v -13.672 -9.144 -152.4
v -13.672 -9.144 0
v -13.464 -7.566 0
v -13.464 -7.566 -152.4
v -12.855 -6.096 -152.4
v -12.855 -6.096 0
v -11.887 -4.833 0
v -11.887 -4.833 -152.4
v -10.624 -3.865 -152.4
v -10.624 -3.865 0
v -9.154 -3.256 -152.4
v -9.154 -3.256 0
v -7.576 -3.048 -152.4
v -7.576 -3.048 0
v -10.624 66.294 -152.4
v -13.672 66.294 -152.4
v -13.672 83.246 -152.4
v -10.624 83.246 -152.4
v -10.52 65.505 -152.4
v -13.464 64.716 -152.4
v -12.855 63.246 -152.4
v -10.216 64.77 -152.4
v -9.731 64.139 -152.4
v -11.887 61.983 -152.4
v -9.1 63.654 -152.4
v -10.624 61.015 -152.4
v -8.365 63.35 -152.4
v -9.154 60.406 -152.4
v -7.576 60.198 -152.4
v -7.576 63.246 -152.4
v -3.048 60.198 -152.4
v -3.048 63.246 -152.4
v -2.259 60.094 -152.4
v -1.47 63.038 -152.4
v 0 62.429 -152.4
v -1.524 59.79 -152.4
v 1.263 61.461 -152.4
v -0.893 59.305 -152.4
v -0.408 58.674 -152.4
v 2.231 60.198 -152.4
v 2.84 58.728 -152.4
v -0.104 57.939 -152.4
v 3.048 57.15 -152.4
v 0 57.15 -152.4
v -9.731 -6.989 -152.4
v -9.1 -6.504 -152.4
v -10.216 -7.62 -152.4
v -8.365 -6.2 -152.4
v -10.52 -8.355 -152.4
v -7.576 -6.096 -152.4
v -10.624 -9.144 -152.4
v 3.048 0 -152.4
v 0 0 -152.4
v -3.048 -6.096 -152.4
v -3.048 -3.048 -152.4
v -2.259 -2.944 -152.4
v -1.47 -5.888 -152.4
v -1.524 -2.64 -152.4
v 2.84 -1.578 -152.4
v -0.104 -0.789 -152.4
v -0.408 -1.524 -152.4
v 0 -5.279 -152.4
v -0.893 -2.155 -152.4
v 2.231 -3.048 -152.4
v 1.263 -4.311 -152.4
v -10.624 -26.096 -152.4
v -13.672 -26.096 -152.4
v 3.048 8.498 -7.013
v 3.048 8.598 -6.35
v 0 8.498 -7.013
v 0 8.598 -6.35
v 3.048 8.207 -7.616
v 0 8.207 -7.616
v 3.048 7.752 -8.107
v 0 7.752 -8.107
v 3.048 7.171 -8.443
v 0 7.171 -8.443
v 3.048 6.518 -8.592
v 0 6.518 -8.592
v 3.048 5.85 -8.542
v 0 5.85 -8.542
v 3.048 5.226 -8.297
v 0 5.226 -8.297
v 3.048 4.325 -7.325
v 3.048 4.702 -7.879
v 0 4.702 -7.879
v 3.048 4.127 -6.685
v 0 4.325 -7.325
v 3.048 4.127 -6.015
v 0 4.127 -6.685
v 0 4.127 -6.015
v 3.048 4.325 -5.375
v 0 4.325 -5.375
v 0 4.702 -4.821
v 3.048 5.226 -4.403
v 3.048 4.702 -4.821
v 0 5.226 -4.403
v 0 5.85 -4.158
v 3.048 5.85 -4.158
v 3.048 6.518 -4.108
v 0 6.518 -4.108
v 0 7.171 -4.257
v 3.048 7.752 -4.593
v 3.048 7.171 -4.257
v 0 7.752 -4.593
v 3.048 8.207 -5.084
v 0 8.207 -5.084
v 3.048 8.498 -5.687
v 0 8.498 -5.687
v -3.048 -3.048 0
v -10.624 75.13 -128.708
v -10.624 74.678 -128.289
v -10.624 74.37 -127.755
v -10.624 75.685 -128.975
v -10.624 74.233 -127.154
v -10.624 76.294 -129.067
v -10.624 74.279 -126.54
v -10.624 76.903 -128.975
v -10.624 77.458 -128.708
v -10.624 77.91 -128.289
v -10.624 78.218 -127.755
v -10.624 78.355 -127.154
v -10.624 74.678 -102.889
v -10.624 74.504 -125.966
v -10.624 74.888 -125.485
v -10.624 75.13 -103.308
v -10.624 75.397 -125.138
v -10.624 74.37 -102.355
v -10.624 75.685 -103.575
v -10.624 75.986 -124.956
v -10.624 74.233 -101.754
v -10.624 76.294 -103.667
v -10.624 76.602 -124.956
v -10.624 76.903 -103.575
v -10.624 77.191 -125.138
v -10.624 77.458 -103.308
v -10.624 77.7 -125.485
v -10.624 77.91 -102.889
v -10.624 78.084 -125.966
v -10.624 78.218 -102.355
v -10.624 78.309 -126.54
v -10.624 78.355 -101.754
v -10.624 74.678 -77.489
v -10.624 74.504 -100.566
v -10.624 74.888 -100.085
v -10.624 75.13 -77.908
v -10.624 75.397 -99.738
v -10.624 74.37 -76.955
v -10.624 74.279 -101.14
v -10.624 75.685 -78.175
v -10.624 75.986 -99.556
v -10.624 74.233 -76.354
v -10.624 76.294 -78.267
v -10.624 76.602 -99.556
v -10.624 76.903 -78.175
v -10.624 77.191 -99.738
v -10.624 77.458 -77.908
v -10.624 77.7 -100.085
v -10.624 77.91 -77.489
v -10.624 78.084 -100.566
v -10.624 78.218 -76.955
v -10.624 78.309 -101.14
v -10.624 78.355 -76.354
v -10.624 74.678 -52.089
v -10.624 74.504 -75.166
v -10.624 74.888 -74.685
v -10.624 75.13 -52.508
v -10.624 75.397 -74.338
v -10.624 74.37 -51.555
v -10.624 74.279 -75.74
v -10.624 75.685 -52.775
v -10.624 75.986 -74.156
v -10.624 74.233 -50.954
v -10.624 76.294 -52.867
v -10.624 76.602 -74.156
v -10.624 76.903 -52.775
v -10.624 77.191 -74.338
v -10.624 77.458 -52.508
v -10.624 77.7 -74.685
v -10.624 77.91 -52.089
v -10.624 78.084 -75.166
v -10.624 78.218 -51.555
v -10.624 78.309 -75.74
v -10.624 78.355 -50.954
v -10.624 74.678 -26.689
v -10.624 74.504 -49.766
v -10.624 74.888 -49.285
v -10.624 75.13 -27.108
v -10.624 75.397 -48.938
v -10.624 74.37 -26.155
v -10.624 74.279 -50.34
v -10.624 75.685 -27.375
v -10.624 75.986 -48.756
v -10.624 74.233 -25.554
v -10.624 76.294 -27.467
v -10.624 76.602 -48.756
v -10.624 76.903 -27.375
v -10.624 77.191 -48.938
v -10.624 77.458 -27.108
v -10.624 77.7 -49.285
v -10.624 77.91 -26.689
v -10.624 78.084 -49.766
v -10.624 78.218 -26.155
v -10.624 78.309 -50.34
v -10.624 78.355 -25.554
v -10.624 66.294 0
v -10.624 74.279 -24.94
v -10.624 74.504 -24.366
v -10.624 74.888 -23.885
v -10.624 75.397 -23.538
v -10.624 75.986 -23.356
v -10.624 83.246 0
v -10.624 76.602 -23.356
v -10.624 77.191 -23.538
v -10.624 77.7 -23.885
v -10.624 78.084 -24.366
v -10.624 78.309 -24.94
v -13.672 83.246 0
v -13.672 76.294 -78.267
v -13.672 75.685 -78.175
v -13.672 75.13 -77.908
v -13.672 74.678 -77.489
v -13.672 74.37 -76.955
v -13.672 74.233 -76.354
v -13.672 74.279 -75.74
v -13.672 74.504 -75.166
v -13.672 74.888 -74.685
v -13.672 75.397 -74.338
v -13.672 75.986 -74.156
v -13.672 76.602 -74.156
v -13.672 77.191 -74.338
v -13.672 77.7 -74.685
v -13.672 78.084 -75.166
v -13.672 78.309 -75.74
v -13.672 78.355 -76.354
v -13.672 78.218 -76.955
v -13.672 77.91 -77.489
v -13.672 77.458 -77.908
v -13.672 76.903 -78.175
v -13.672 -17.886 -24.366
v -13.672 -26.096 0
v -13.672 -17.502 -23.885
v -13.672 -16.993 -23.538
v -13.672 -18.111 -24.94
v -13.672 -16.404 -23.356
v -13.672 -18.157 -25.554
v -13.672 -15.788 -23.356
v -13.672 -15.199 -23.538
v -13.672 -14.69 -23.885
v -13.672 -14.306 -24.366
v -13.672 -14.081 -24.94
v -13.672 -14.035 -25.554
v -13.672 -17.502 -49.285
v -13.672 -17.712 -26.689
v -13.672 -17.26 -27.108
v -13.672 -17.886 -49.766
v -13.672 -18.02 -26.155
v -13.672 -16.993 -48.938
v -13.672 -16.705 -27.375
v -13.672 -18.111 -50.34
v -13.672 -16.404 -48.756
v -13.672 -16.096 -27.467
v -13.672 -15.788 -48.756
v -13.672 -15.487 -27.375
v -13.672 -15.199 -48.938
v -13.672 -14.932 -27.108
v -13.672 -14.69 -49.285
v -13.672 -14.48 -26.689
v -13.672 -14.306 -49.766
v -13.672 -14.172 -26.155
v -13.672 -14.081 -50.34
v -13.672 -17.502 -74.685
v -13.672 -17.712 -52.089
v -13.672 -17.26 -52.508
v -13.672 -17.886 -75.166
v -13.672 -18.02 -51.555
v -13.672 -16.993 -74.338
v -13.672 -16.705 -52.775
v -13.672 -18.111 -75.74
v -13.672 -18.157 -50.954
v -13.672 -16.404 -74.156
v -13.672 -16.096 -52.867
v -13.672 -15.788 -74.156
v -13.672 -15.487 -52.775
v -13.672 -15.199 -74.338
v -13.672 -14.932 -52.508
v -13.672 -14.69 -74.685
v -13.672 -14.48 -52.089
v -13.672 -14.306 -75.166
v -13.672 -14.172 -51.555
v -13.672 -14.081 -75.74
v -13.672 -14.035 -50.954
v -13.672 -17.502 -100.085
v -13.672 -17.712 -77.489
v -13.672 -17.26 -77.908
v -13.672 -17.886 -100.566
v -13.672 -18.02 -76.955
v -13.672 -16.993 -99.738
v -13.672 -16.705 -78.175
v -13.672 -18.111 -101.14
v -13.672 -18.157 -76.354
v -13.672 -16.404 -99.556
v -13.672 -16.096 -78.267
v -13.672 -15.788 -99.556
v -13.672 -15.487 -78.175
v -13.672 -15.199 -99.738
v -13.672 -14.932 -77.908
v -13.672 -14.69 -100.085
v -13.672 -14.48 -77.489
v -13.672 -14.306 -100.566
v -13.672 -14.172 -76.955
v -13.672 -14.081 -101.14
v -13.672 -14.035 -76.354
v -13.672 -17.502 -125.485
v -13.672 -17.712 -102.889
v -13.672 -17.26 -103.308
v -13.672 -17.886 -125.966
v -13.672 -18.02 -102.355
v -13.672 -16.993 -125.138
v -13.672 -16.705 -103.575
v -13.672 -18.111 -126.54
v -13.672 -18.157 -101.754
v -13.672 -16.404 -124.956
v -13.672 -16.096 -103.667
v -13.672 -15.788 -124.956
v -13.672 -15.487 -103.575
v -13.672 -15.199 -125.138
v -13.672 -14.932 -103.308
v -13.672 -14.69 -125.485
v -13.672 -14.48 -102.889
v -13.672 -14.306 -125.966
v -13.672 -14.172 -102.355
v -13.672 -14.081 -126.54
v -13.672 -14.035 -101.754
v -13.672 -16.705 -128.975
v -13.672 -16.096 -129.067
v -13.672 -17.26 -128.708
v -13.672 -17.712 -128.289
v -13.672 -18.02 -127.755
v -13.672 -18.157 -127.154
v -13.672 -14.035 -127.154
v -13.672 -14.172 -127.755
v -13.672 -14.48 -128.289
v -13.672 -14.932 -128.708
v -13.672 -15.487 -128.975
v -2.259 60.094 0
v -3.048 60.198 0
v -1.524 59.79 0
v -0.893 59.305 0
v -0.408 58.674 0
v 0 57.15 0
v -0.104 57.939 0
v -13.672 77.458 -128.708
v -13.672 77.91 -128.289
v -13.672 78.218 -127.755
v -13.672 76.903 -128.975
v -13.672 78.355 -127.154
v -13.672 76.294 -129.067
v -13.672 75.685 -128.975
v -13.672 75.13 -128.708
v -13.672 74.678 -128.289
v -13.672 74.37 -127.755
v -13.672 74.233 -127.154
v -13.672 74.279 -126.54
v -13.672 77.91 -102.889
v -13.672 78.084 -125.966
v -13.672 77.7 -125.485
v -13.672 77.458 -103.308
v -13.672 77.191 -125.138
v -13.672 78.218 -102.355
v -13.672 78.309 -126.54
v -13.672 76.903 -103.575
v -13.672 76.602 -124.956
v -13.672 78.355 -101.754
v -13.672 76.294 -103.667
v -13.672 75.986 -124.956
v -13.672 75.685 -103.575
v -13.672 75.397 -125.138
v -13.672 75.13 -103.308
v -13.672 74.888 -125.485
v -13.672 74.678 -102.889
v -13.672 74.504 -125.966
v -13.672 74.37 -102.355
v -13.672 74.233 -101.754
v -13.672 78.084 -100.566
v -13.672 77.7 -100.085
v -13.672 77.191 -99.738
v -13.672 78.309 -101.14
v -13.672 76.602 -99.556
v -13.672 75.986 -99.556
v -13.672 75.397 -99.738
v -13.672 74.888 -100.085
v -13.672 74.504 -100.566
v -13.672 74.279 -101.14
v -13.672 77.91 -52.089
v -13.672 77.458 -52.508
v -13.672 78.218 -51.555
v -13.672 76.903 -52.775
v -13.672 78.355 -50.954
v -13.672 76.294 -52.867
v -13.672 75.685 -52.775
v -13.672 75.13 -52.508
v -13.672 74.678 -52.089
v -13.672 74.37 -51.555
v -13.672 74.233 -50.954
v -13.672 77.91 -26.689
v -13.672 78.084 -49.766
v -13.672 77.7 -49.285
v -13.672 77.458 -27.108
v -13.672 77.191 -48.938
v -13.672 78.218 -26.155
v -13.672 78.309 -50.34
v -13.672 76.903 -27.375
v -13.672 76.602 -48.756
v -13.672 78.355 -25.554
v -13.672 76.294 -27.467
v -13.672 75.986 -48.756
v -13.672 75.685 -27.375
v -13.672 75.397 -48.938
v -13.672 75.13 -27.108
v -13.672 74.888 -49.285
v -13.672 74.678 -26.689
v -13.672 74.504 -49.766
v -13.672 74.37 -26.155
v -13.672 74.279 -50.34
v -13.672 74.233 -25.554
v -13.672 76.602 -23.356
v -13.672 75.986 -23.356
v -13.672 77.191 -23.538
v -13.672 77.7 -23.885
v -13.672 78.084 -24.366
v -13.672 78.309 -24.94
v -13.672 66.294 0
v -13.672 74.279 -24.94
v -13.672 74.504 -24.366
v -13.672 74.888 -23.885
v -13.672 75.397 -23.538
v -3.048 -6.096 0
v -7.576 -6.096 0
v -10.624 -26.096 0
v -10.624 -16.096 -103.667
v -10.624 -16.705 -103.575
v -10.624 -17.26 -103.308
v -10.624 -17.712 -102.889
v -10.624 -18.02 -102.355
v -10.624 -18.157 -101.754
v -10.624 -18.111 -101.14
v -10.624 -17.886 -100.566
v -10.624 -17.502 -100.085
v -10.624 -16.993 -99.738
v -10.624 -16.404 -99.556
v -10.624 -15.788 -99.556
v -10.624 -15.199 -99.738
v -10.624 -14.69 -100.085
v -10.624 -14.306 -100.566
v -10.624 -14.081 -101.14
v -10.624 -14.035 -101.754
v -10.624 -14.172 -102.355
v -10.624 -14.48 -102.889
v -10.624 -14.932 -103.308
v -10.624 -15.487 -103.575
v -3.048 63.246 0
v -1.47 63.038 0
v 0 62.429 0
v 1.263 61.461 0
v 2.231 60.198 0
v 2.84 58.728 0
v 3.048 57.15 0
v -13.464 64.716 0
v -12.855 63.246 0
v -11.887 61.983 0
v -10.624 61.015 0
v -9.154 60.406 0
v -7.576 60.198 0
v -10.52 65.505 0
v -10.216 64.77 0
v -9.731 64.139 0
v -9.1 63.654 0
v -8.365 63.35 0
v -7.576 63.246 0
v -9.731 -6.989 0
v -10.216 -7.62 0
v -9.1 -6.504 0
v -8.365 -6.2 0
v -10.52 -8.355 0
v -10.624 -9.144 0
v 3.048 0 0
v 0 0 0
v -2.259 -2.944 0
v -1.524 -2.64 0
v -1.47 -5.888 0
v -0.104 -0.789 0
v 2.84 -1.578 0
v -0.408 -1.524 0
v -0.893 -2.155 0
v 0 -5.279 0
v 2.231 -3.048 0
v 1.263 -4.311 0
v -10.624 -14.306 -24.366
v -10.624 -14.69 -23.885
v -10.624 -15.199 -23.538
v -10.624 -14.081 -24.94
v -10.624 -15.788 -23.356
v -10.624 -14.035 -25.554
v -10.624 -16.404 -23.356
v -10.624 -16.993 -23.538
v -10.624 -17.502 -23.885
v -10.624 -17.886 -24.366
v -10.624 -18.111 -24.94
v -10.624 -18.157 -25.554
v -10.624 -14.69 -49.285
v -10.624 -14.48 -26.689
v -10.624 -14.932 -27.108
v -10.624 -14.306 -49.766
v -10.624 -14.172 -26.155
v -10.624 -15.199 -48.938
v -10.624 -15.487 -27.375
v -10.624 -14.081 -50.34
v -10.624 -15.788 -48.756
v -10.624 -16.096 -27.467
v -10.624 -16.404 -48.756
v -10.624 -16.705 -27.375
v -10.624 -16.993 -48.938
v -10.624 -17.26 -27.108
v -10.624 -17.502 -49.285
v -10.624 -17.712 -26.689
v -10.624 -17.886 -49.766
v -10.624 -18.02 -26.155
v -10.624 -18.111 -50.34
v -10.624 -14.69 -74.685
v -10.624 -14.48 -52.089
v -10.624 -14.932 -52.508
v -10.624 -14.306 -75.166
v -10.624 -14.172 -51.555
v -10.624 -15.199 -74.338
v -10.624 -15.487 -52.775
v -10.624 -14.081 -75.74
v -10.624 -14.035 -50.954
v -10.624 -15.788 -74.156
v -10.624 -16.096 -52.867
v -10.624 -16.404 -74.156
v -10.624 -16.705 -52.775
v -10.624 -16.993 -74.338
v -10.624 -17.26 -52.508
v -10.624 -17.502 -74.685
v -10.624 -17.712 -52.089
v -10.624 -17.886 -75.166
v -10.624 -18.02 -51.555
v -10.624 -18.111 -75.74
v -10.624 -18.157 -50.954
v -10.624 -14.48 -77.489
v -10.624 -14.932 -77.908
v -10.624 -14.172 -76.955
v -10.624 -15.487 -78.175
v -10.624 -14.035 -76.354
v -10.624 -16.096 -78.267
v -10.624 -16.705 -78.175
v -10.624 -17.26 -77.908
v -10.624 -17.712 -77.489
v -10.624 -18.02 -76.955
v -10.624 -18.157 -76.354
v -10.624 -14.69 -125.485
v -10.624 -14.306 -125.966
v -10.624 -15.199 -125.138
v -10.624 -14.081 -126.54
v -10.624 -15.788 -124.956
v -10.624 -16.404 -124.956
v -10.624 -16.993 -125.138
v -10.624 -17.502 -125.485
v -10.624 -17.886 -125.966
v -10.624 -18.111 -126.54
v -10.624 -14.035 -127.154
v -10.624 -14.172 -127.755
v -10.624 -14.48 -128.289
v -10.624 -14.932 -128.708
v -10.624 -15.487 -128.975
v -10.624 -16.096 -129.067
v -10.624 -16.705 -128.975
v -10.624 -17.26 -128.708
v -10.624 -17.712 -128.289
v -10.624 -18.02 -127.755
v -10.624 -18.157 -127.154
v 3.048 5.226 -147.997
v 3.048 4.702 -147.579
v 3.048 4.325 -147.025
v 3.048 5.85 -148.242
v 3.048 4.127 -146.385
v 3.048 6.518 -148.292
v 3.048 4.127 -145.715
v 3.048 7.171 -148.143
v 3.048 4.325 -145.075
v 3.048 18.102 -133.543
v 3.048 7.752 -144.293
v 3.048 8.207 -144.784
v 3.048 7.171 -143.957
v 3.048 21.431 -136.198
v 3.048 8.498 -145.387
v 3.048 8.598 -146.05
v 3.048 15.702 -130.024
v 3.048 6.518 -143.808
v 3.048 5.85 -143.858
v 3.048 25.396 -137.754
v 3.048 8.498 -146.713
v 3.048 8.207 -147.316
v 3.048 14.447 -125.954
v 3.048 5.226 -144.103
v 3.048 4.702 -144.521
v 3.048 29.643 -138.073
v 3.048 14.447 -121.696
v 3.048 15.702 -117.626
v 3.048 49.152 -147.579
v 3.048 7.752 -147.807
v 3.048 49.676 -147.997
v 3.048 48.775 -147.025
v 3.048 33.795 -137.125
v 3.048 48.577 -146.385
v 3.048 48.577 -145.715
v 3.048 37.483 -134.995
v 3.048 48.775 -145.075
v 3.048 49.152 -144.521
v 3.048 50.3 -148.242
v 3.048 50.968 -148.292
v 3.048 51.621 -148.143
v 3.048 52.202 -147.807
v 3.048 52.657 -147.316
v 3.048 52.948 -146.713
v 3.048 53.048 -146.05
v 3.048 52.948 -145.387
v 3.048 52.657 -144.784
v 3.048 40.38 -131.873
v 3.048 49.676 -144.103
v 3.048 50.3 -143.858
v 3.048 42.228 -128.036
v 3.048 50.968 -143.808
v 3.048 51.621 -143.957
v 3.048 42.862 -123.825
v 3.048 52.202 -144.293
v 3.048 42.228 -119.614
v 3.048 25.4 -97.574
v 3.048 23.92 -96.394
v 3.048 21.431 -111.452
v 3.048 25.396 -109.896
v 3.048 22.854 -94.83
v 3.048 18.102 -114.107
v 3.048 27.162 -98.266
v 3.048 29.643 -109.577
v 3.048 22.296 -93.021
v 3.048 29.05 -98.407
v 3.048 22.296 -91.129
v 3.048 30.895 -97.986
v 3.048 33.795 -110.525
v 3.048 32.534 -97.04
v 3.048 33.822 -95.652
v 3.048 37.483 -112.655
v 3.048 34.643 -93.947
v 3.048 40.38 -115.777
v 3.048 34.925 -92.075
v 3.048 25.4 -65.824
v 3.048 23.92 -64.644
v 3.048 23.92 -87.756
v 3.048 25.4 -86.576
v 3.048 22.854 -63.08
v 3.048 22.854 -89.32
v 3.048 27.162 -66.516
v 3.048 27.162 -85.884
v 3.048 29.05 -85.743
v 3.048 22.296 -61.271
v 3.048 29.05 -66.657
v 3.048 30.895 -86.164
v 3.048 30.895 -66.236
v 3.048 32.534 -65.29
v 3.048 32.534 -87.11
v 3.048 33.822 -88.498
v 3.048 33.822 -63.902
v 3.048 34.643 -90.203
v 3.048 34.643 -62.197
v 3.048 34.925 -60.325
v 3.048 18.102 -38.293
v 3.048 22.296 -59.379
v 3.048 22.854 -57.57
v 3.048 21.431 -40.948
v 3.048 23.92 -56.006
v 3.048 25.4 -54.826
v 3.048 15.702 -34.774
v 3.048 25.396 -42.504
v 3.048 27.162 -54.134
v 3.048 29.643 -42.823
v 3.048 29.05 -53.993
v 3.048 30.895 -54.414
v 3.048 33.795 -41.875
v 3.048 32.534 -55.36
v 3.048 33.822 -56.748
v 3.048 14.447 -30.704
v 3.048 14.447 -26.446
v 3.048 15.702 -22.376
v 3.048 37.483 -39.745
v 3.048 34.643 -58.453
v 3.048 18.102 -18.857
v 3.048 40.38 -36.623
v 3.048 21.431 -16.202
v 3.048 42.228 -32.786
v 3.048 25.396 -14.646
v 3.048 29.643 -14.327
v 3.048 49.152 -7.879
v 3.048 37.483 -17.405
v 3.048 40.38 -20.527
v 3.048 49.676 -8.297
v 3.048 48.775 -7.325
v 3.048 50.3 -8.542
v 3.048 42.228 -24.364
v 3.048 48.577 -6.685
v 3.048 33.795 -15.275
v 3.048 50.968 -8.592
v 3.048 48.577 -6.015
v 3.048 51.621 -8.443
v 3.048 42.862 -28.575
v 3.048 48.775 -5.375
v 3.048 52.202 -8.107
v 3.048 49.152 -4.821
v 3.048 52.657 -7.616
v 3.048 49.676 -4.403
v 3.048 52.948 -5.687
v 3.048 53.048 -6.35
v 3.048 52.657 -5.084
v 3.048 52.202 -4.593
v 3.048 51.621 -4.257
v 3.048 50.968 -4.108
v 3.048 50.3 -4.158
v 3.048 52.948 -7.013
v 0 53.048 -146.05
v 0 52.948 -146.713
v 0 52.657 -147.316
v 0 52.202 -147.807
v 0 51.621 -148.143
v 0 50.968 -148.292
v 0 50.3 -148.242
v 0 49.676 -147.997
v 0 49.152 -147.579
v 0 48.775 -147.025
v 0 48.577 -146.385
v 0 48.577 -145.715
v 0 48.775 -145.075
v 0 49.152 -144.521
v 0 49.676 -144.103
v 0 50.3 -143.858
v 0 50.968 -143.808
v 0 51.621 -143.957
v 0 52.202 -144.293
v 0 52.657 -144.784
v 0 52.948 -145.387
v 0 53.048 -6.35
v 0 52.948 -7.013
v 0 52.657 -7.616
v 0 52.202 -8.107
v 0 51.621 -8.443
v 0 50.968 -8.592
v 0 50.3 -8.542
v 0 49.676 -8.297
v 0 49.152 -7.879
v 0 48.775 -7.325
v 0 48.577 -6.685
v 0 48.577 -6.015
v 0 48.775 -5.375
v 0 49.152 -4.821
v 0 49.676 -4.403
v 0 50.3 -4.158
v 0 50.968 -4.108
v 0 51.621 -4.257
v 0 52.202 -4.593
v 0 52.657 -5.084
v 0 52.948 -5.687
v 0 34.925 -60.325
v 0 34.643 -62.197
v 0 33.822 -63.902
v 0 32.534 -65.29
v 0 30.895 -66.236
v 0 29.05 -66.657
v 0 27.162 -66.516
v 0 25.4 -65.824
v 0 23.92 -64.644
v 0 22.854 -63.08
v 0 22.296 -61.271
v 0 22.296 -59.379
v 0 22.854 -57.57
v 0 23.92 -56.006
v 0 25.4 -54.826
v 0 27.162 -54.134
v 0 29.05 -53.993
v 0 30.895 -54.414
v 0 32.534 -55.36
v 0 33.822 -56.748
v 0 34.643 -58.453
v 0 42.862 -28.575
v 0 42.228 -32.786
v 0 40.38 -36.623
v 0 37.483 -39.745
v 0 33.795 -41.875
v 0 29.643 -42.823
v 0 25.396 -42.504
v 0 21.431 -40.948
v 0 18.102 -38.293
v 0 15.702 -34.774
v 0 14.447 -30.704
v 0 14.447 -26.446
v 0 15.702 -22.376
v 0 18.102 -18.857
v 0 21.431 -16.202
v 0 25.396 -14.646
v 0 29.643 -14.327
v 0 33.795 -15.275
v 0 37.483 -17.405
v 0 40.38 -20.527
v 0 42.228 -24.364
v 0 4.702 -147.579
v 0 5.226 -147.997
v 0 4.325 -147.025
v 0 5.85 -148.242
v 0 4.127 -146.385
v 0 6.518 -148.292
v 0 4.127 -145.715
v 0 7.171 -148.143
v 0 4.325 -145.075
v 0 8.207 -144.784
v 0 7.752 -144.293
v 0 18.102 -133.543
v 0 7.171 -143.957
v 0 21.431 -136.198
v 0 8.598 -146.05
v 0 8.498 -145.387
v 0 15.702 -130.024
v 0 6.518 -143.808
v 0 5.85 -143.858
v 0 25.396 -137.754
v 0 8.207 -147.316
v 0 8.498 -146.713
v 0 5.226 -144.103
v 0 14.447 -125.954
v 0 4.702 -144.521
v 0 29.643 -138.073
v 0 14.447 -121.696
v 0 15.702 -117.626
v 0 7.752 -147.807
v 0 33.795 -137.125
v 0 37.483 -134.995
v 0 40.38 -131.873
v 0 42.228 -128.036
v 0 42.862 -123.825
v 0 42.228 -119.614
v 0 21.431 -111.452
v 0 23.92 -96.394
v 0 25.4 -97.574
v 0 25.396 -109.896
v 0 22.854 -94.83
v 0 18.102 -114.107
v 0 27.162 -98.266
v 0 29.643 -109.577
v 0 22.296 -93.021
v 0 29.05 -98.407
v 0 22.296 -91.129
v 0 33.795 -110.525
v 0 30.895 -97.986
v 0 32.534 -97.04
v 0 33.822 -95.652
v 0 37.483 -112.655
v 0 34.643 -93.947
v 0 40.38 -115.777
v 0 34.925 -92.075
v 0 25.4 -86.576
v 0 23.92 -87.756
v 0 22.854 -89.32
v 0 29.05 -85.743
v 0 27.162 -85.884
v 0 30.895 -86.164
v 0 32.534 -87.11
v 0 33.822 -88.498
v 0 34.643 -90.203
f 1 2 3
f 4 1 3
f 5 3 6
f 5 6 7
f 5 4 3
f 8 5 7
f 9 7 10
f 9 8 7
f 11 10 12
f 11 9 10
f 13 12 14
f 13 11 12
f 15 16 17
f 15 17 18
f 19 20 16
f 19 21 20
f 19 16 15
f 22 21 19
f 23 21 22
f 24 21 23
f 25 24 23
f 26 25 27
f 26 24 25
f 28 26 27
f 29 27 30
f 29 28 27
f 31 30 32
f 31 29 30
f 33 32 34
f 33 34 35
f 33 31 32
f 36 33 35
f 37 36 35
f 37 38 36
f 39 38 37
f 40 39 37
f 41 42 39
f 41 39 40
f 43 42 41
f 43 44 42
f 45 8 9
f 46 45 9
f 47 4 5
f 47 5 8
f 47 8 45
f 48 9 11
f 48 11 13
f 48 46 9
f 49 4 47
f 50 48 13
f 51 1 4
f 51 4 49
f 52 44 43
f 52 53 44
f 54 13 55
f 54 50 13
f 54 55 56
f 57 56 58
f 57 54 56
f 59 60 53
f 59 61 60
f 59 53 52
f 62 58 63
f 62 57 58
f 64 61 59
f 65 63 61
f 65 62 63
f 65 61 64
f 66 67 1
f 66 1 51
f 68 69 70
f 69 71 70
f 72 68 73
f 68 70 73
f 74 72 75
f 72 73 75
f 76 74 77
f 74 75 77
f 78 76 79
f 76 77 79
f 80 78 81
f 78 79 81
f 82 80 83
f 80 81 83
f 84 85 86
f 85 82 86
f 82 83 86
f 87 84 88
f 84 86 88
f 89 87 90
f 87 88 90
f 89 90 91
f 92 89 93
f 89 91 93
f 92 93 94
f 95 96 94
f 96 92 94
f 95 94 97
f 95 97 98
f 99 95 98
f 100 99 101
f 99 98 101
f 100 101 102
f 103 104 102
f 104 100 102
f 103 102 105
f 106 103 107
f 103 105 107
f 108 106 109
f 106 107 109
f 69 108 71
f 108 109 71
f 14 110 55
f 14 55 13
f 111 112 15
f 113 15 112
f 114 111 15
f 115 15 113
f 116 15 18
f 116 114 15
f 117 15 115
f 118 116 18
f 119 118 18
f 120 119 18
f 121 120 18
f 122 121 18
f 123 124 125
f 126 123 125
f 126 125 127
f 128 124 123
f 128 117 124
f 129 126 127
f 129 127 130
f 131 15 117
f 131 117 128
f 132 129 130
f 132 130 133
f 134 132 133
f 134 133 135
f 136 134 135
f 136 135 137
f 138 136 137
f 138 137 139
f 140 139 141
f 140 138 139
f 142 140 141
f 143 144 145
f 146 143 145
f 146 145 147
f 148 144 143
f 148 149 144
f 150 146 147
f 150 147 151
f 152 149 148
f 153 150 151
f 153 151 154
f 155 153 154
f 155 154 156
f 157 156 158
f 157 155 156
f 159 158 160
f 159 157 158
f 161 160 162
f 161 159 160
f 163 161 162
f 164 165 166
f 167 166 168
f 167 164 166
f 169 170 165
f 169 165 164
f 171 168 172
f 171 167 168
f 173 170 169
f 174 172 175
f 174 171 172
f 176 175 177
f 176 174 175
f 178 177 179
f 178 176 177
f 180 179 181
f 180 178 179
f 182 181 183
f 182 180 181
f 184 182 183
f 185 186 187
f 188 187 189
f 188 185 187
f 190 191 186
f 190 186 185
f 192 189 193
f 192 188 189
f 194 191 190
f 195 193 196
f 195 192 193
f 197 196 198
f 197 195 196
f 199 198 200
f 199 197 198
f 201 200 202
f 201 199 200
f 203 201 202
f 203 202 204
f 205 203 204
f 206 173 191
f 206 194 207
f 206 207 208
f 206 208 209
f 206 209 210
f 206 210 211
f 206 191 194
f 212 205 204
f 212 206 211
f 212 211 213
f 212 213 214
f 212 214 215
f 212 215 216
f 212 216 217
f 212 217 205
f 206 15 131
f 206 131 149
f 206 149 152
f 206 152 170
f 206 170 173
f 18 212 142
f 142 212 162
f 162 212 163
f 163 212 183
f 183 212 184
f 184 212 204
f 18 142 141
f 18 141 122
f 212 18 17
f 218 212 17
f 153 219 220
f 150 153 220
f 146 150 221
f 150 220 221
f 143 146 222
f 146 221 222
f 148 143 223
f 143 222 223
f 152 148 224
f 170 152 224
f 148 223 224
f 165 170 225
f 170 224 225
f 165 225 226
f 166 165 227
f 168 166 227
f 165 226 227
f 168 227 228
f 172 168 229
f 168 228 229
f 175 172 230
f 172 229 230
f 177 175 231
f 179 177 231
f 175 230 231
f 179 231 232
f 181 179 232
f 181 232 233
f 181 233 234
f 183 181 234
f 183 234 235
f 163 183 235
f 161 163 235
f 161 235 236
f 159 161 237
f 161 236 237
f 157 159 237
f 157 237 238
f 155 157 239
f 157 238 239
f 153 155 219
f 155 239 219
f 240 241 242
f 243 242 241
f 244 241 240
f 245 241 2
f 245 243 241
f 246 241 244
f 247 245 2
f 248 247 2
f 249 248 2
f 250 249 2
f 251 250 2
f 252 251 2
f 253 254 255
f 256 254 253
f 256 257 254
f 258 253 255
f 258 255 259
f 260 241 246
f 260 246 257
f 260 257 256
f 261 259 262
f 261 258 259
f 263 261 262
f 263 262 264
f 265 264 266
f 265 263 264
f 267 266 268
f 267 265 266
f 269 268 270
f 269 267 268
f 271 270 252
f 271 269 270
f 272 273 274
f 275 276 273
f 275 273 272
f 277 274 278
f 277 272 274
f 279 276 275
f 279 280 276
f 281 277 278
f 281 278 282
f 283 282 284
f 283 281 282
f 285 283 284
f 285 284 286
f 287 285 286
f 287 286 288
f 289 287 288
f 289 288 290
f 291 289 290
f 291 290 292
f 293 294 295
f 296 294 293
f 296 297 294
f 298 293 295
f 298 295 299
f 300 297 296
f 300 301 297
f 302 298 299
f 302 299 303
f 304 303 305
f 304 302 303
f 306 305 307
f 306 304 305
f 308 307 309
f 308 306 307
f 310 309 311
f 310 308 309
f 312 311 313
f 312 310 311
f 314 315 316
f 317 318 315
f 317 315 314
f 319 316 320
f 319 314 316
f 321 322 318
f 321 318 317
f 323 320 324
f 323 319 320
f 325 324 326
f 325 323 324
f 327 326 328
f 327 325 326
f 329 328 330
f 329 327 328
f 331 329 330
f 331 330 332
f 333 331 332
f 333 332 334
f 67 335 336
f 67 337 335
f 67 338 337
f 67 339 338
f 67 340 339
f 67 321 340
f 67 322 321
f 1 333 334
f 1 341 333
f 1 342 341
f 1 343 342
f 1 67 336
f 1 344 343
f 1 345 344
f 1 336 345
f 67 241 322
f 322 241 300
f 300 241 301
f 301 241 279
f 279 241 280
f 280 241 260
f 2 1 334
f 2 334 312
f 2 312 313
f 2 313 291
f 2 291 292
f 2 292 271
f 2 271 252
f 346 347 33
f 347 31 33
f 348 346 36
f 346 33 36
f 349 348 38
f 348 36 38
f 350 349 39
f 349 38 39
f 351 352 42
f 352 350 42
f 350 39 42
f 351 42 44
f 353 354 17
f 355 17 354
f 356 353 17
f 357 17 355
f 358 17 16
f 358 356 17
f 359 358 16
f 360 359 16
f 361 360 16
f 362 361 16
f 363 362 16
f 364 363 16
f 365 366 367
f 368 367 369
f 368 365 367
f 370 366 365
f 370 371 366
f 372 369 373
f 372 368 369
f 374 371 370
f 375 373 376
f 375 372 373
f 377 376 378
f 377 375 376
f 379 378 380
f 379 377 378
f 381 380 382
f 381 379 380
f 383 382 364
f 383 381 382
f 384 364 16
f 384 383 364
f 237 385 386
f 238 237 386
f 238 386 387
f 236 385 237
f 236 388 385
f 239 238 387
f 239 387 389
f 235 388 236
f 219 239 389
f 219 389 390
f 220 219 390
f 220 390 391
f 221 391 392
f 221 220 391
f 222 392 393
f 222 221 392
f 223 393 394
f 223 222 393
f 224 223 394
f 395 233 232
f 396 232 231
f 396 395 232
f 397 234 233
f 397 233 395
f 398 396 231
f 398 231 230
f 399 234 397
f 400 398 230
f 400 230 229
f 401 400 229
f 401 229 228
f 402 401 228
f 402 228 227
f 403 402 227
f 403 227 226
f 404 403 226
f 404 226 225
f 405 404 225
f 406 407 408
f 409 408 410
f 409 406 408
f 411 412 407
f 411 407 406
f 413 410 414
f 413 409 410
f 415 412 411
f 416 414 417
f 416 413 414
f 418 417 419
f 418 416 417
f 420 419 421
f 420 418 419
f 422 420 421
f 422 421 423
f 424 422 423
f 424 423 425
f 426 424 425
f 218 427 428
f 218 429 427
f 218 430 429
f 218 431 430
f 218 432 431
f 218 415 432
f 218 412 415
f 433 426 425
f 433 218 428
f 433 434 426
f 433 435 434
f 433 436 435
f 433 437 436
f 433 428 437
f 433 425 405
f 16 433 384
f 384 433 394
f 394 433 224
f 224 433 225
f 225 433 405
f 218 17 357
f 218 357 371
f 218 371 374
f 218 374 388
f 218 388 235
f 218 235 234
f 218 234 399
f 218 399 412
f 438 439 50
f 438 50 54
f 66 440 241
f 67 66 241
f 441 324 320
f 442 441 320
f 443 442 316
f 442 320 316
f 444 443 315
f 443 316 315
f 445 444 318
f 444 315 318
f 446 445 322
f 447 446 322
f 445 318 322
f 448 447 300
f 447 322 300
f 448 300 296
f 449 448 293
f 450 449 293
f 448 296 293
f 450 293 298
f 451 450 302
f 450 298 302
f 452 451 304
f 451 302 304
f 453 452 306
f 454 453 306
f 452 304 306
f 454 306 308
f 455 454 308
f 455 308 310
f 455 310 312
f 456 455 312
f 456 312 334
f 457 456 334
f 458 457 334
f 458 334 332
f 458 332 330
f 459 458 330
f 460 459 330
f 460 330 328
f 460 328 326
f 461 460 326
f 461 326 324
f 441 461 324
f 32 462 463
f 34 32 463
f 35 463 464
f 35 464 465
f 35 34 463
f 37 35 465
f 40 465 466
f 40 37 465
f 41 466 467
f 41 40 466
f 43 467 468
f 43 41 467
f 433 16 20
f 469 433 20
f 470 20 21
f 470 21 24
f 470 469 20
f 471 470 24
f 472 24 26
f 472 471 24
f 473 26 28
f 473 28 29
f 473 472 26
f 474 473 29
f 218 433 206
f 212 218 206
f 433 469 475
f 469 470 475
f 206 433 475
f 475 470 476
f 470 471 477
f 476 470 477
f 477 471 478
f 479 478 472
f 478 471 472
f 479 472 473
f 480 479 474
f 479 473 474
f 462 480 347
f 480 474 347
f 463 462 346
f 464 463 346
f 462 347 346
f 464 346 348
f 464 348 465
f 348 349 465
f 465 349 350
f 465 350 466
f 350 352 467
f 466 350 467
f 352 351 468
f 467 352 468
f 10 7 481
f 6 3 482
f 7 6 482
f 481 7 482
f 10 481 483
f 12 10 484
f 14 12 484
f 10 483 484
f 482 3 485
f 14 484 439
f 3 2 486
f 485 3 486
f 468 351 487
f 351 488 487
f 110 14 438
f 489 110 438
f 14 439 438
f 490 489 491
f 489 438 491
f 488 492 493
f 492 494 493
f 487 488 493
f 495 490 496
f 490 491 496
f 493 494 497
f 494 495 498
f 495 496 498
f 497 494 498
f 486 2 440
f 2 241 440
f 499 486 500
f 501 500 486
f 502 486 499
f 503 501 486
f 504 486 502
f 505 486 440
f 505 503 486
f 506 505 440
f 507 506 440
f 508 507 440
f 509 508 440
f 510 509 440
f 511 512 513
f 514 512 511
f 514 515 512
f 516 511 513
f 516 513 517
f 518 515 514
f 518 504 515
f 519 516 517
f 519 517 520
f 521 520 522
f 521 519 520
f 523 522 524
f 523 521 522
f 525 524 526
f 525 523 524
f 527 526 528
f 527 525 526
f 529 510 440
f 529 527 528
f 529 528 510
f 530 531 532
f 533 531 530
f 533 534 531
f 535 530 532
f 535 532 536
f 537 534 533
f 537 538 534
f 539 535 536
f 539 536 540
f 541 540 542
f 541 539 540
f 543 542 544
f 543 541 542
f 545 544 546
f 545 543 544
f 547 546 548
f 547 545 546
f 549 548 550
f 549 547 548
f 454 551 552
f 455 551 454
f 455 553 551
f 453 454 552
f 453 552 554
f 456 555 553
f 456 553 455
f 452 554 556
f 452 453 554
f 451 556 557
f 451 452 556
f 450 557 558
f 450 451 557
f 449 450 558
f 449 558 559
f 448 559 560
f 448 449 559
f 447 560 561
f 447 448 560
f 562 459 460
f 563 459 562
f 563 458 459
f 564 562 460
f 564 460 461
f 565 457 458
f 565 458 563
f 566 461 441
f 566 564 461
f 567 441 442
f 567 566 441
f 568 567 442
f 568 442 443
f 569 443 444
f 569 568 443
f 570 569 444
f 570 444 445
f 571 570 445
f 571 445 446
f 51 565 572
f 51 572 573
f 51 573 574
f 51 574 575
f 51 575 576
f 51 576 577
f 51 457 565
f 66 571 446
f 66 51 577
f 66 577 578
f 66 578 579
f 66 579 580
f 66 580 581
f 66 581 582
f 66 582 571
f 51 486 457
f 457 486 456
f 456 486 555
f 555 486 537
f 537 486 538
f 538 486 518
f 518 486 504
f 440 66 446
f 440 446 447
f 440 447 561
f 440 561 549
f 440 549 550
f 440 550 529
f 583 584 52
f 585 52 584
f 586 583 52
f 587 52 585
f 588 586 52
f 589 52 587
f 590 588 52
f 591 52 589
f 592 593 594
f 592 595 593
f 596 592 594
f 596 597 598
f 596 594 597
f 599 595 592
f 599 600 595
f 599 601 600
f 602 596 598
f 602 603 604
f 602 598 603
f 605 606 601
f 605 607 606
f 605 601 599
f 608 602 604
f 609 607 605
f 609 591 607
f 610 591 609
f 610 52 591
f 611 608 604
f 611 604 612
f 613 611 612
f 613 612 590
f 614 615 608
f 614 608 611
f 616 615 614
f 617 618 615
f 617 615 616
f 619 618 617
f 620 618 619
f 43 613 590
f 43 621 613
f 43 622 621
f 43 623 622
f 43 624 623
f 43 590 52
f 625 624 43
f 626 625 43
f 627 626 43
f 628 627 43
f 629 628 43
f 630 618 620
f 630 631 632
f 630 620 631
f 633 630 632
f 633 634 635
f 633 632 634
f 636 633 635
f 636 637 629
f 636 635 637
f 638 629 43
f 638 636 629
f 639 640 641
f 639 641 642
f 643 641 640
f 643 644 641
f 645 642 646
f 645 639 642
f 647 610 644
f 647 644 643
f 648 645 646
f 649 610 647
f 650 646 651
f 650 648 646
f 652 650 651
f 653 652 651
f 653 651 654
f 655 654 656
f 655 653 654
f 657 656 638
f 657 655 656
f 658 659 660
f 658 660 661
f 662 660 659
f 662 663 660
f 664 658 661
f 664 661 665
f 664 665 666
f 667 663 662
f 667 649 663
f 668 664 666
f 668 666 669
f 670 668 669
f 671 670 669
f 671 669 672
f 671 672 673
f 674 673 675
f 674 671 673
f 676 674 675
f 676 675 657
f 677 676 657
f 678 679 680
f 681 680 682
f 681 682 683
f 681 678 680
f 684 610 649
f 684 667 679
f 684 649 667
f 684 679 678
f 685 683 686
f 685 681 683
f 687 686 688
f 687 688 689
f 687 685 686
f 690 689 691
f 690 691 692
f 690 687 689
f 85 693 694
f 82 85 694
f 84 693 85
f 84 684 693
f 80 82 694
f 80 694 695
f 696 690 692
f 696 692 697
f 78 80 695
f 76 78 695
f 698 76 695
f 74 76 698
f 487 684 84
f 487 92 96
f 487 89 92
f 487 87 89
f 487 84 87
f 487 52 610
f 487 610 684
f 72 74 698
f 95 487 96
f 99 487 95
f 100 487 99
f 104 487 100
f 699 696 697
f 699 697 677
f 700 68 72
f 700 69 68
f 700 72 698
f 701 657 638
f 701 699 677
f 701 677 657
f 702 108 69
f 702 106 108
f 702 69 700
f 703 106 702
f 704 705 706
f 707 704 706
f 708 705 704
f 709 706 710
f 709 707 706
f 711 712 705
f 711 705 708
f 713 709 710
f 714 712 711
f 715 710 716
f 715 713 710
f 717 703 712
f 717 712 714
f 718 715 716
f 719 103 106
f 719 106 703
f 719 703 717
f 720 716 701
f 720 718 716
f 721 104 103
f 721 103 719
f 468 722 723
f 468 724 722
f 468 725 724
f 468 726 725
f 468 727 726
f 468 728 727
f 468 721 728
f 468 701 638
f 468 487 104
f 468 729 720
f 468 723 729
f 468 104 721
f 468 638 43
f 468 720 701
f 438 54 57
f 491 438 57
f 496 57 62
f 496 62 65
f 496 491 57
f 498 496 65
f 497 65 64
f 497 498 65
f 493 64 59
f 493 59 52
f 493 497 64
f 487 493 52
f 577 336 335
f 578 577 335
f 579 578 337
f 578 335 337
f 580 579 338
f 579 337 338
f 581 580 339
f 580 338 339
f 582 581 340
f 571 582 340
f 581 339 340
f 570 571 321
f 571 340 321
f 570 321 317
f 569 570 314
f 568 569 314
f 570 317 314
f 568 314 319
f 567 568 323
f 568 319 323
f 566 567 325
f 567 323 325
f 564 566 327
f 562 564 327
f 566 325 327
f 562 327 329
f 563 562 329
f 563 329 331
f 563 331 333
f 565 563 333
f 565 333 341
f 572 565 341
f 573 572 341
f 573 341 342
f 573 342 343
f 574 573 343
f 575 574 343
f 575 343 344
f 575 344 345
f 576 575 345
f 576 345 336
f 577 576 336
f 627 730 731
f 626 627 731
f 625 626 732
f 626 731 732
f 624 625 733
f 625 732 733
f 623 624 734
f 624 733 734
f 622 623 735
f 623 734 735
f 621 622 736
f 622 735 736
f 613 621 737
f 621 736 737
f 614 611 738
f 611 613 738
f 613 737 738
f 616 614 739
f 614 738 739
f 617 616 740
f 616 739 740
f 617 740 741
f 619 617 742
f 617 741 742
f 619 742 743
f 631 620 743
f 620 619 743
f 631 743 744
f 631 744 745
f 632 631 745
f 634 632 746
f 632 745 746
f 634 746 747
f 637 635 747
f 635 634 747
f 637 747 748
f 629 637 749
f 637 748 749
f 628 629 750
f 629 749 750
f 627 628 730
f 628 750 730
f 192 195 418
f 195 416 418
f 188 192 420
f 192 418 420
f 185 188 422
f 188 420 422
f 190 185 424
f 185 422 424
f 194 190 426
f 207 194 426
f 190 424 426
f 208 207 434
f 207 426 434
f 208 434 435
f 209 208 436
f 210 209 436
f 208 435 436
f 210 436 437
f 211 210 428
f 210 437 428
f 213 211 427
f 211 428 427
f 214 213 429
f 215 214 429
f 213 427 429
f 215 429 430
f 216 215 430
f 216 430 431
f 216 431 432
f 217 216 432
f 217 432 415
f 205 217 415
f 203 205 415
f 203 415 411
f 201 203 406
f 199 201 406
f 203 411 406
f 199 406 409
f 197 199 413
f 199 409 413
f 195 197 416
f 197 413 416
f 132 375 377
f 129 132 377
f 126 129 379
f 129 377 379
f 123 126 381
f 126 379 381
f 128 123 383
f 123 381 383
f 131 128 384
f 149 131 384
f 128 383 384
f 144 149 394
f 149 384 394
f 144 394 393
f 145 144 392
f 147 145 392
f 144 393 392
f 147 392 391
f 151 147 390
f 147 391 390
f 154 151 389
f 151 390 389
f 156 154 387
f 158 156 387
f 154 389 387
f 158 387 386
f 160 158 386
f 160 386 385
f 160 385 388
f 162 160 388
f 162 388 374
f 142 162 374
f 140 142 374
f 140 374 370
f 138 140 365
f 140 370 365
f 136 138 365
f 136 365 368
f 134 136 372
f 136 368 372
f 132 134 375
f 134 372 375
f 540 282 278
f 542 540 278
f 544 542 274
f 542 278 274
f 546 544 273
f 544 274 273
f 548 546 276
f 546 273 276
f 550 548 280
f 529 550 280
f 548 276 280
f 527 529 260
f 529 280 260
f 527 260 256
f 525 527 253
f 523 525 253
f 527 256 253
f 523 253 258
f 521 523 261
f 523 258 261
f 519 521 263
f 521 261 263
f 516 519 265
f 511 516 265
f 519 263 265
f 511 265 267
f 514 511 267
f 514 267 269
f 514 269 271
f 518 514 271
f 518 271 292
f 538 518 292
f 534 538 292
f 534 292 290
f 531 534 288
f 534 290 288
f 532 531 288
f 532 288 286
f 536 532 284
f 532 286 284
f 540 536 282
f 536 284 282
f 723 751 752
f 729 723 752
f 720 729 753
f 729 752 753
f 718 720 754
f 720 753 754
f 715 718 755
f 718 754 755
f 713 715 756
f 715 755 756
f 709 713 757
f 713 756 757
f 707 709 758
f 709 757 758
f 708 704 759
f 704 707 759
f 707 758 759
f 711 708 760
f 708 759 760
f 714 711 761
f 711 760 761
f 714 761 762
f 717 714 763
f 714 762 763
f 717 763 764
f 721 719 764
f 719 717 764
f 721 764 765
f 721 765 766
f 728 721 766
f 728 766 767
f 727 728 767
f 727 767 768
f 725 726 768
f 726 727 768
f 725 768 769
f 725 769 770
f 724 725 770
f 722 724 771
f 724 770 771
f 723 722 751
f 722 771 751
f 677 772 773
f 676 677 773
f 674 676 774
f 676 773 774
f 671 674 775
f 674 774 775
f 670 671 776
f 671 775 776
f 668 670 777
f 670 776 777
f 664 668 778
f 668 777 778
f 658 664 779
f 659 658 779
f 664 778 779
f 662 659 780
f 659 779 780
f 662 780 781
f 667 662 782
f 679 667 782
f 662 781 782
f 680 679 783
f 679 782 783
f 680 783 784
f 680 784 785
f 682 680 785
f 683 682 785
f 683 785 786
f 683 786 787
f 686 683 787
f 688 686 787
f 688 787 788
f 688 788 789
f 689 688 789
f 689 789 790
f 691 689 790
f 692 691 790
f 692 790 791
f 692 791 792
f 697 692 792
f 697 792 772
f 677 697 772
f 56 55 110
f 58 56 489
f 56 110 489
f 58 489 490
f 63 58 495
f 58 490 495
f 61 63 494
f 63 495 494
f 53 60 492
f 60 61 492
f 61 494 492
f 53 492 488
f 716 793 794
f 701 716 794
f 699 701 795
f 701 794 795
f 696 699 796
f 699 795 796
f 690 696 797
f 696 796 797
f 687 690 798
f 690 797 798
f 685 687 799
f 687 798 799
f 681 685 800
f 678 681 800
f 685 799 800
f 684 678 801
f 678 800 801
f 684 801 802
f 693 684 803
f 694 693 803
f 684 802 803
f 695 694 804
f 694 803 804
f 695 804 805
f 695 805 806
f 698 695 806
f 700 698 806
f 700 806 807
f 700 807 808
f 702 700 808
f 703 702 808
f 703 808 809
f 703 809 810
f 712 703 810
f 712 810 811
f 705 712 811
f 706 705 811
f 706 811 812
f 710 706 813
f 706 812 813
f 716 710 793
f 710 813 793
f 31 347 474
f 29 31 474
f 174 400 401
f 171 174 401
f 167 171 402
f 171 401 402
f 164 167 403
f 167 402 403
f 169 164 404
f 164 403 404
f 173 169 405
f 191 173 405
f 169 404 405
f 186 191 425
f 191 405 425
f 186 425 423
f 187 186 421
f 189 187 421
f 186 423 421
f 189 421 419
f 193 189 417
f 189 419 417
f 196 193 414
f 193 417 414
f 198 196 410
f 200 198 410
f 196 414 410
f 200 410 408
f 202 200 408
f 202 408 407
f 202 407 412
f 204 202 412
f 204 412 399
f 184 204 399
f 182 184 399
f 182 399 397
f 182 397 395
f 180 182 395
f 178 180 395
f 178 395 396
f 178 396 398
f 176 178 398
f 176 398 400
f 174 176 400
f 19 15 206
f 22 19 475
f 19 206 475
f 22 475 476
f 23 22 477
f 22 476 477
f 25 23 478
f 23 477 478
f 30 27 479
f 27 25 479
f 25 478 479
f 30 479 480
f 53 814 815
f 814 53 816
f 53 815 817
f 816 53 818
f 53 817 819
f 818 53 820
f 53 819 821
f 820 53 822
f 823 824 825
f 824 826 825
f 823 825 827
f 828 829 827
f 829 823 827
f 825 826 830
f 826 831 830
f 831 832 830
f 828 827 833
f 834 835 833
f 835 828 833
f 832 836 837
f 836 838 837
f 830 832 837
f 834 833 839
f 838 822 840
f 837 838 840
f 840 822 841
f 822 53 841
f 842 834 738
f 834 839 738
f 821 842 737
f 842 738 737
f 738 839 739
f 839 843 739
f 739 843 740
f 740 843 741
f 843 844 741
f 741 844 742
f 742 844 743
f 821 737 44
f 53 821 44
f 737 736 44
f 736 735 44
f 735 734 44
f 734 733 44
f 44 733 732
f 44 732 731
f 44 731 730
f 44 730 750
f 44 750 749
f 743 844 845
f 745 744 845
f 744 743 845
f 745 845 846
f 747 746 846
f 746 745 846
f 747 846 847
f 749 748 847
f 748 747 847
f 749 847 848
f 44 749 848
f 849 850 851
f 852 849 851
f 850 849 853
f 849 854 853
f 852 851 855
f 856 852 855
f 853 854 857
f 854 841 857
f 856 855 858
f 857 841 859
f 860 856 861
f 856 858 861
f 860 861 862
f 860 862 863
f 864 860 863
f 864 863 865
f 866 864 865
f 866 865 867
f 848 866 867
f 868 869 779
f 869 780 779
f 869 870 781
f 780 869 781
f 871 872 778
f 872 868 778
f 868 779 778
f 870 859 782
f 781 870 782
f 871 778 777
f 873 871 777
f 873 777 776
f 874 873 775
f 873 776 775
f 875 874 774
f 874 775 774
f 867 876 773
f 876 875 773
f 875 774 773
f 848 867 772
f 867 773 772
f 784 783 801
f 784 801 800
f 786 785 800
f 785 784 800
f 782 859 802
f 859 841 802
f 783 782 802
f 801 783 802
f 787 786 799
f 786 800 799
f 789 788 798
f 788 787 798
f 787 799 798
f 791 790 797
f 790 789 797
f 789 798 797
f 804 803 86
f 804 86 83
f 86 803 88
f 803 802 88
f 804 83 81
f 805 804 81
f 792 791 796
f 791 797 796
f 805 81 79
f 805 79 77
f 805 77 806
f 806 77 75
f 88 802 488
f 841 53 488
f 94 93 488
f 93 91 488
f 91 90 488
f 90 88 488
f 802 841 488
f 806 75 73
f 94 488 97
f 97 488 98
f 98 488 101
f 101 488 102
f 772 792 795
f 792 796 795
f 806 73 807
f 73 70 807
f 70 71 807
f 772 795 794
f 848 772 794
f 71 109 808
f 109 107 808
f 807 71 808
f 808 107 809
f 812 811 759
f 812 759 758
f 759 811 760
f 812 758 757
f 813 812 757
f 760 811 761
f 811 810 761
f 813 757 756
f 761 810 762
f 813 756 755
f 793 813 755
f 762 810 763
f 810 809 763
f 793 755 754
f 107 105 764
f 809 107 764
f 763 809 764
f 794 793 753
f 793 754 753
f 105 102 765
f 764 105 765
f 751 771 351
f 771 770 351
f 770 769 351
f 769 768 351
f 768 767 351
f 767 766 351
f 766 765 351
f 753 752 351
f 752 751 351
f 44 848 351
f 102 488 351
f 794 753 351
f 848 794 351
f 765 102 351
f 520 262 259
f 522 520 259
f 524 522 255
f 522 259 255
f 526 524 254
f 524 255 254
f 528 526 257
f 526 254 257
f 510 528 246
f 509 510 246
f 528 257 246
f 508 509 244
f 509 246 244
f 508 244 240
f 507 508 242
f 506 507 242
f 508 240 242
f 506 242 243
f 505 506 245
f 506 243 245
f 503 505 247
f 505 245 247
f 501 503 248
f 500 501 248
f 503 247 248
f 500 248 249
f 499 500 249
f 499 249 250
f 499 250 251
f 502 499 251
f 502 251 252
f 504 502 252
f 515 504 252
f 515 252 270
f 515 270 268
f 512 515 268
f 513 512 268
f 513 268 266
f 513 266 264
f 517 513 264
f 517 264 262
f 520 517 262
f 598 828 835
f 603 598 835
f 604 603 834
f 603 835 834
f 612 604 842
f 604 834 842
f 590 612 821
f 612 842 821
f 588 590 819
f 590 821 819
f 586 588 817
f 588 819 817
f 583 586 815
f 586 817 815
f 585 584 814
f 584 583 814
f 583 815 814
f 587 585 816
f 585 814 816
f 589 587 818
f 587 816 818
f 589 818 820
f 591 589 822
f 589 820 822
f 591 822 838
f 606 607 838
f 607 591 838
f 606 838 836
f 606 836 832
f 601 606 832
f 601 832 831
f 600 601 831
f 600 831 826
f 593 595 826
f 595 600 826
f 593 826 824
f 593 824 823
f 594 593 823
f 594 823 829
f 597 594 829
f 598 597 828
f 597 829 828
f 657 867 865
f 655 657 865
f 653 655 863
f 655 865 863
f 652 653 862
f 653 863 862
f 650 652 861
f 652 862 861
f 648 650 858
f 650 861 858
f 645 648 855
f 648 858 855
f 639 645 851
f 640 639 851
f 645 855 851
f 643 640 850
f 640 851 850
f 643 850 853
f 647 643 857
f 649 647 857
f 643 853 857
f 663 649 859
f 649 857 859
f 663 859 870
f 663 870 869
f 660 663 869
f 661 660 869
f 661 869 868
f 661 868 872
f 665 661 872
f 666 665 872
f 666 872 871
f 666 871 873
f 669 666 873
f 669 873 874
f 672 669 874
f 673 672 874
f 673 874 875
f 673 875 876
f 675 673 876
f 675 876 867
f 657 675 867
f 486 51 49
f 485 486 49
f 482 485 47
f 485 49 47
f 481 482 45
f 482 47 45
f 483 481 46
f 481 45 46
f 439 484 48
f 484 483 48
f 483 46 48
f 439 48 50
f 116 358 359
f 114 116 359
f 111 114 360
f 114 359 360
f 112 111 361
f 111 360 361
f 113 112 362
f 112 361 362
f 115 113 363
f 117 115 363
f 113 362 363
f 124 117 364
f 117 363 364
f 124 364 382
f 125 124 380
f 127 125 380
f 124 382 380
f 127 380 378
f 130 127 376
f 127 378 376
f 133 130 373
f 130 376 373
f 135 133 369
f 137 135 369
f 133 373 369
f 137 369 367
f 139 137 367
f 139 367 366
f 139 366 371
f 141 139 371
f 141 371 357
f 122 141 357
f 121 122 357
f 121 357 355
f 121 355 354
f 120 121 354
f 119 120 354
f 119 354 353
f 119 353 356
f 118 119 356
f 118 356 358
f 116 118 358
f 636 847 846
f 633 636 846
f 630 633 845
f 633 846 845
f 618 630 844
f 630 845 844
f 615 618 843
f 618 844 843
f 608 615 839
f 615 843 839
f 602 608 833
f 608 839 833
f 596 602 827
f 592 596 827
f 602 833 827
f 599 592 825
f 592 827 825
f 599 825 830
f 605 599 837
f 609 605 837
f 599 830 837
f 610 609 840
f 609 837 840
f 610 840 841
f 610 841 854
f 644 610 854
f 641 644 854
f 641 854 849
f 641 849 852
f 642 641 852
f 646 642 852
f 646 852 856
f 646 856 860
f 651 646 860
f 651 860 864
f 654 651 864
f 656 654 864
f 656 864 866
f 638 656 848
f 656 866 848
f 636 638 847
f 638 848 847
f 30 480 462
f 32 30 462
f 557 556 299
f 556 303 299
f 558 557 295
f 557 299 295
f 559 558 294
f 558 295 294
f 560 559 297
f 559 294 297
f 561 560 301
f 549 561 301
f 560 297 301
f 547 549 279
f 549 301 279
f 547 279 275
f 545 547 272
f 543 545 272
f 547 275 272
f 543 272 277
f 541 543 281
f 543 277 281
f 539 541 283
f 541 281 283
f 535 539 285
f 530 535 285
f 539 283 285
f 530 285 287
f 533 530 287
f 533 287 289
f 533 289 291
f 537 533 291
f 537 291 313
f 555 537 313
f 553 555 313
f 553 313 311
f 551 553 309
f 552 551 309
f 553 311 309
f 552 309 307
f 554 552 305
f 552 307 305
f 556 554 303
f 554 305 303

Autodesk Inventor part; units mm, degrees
ref_plane "YZ Plane" through (0, 0, 0) normal (1, 0, 0) x (0, 1, 0)
ref_plane "XZ Plane" through (0, 0, 0) normal (0, 1, 0) x (-1, 0, 0)
ref_plane "XY Plane" through (0, 0, 0) normal (0, 0, 1) x (1, 0, 0)
sketch "Sketch3" plane through (-13.672, 63.246, 0) normal (0, 1, 0) x (1, 0, 0)
  line L0 (10.624, 0) -> (10.624, 152.4) projected
  line L1 (0, 152.4) -> (10.624, 152.4) projected
  line L2 (0, 0) -> (0, 152.4) projected
  line L3 (10.624, 0) -> (0, 0) projected
  point P0 (13.672, 0)
  point P1 (5.312, 127)
  point P2 (5.312, 152.4)
  point P3 (5.312, 101.6)
  point P4 (5.312, 76.2)
  point P5 (5.312, 50.8)
  point P6 (5.312, 25.4)
  dimension "d28" = 25.4
  dimension "d31" = 25.4
sketch "Sketch1" plane through (0, 0, 0) normal (1, 0, 0) x (0, 1, 0)
  line L0 (0, 0) -> (57.15, 0)
  line L1 (57.15, 0) -> (57.15, -152.4)
  line L2 (57.15, -152.4) -> (0, -152.4)
  line L3 (0, -152.4) -> (0, 0)
  circle A0 centre (28.575, -28.575) radius 14.2875
  circle A1 centre (28.575, -60.325) radius 6.35
  circle A2 centre (28.575, -92.075) radius 6.35
  circle A3 centre (28.575, -123.825) radius 14.2875
  circle A4 centre (50.8, -6.35) radius 2.2479
  circle A5 centre (50.8, -146.05) radius 2.2479
  circle A6 centre (6.35, -146.05) radius 2.2479
  circle A7 centre (6.35, -6.35) radius 2.2479
  line L4 (50.8, -6.35) -> (6.35, -6.35) construction
  line L5 (6.35, -6.35) -> (6.35, -146.05) construction
  line L6 (6.35, -146.05) -> (50.8, -146.05) construction
  line L7 (50.8, -146.05) -> (50.8, -6.35) construction
  line L8 (57.15, 0) -> (69.85, 0)
  line L9 (69.85, 0) -> (69.85, -152.4)
  line L10 (69.85, -152.4) -> (57.15, -152.4)
  line L11 (57.15, -152.4) -> (57.15, 0)
  line L12 (0, -152.4) -> (-12.7, -152.4)
  line L13 (-12.7, -152.4) -> (-12.7, 0)
  line L14 (-12.7, 0) -> (0, 0)
  line L15 (0, 0) -> (0, -152.4)
  line L16 (28.575, -123.825) -> (28.575, -28.575)
  point P0 (28.575, -152.4)
  point P1 (28.575, -6.35)
  point P2 (28.575, 0)
  point P3 (50.8, -76.2)
  point P4 (57.15, -76.2)
  point P5 (57.15, -76.2)
  point P6 (28.575, -76.2)
  dimension "d0" = 57.15
  dimension "d1" = 152.4
  dimension "d2" = 31.75
  dimension "d3" = 31.75
  dimension "d4" = 31.75
  dimension "d6" = 28.575
  dimension "d7" = 12.7
  dimension "d8" = 28.575
  dimension "d11" = 4.4958
  dimension "d12" = 139.7
  dimension "d13" = 44.45
  dimension "d14" = 12.7
  dimension "d15" = 152.4
  dimension "d16" = 12.7
  dimension "d17" = 152.4
extrude "Plate2" add sketch "Sketch1" along normal blind 3.048 contours L0 L1 L2 L3
sketch "Sketch2" plane through (-3.048, 60.198, -152.4) normal (0, 1, 0) x (-1, 0, 0)
  line L0 (0, 152.4) -> (0, 0)
  line L1 (0, 0) -> (10.624, 0)
  line L2 (10.624, 0) -> (10.624, 152.4)
  line L3 (10.624, 152.4) -> (0, 152.4)
edge flange "Flange1" height 16.72 angle 90 thickness 3.048 bend radius 3.048 thickness toward (0, 1, 0) relief tear relief width 3.048 relief depth 1.524 corner gap 3.048 corner form 0 edges at (0, 57.15, -76.2) (0, 0, -76.2) wall of the first edge with corners at (-3.048, 60.198, 0) (-3.048, 60.198, -152.4) (-13.672, 60.198, -152.4) (-13.672, 60.198, 0)
bend "Bend1"
corner "Corner1"
sketch "Sketch4" plane through (-10.624, -3.048, -152.4) normal (-1, 0, 0) x (0, -1, 0)
  line L0 (0, 152.4) -> (0, 0)
  line L1 (0, 0) -> (23.048, 0)
  line L2 (23.048, 0) -> (23.048, 152.4)
  line L3 (23.048, 152.4) -> (0, 152.4)
edge flange "Flange2" height 20 angle 90 thickness 3.048 bend radius 3.048 thickness toward (-1, 0, 0) relief tear relief width 3.048 relief depth 1.524 corner gap 3.048 corner form 0 edges at (-13.672, -6.096, -76.2) (-13.672, 63.246, -76.2) wall of the first edge with corners at (-10.624, -3.048, 0) (-10.624, -3.048, -152.4) (-10.624, -26.096, -152.4) (-10.624, -26.096, 0)
bend "Bend2"
corner "Corner2"
sketch "Sketch5" plane through (-10.624, -26.096, 0) normal (1, 0, 0) x (0, 0, -1)
  line L0 (152.4, 16.952) -> (152.4, 0) projected
  line L1 (0, 0) -> (152.4, 0) projected
  point P0 (0, 26.096)
  point P1 (127, 10)
  point P2 (101.6, 10)
  point P3 (76.2, 10)
  point P4 (50.8, 10)
  point P5 (25.4, 10)
  point P6 (50.8, 102.39)
  point P7 (25.4, 102.39)
  point P8 (76.2, 102.39)
  point P9 (101.6, 102.39)
  point P10 (127, 102.39)
  dimension "d53" = 25.4
  dimension "d54" = 10
  dimension "d57" = 25.4
  dimension "d74" = 92.39
hole "Hole2" at (-10.624, -16.096, -127) at (-10.624, -16.096, -101.6) at (-10.624, -16.096, -76.2) at (-10.624, -16.096, -50.8) at (-10.624, -16.096, -25.4) at (-10.624, 76.294, -25.4) at (-10.624, 76.294, -50.8) at (-10.624, 76.294, -76.2) at (-10.624, 76.294, -101.6) at (-10.624, 76.294, -127) direction (-1, 0, 0) diameter 4.134 end through all
equation "\"d10\" = Thickness"
equation "\"d18\" = BendReliefWidth"
equation "\"d19\" = BendReliefDepth"
equation "\"d20\" = MinimumRemnant"
equation "\"d21\" = TransitionRadius"
equation "\"d24\" = BendRadius"
equation "\"d25\" = CornerReliefSize"
equation "\"d26\" = GapSize"
equation "\"d27\" = JacobiRadiusSize"
equation "\"d43\" = BendReliefWidth"
equation "\"d44\" = BendReliefDepth"
equation "\"d45\" = MinimumRemnant"
equation "\"d46\" = TransitionRadius"
equation "\"d49\" = BendRadius"
equation "\"d50\" = CornerReliefSize"
equation "\"d51\" = GapSize"
equation "\"d52\" = JacobiRadiusSize"
equation "\"BendRadius\" = Thickness"
equation "\"BendReliefWidth\" = Thickness"
equation "\"BendReliefDepth\" = 0.5 * Thickness"
equation "\"CornerReliefSize\" = 4 * Thickness"
equation "\"MinimumRemnant\" = 2 * Thickness"
equation "\"TransitionRadius\" = BendRadius"
equation "\"JacobiRadiusSize\" = BendRadius"
equation "\"GapSize\" = Thickness"
equation "\"Thickness\" = 3.048"
properties part number "CH-1-01-RearGearboxHousingMotorSide" material "Steel, Alloy"
